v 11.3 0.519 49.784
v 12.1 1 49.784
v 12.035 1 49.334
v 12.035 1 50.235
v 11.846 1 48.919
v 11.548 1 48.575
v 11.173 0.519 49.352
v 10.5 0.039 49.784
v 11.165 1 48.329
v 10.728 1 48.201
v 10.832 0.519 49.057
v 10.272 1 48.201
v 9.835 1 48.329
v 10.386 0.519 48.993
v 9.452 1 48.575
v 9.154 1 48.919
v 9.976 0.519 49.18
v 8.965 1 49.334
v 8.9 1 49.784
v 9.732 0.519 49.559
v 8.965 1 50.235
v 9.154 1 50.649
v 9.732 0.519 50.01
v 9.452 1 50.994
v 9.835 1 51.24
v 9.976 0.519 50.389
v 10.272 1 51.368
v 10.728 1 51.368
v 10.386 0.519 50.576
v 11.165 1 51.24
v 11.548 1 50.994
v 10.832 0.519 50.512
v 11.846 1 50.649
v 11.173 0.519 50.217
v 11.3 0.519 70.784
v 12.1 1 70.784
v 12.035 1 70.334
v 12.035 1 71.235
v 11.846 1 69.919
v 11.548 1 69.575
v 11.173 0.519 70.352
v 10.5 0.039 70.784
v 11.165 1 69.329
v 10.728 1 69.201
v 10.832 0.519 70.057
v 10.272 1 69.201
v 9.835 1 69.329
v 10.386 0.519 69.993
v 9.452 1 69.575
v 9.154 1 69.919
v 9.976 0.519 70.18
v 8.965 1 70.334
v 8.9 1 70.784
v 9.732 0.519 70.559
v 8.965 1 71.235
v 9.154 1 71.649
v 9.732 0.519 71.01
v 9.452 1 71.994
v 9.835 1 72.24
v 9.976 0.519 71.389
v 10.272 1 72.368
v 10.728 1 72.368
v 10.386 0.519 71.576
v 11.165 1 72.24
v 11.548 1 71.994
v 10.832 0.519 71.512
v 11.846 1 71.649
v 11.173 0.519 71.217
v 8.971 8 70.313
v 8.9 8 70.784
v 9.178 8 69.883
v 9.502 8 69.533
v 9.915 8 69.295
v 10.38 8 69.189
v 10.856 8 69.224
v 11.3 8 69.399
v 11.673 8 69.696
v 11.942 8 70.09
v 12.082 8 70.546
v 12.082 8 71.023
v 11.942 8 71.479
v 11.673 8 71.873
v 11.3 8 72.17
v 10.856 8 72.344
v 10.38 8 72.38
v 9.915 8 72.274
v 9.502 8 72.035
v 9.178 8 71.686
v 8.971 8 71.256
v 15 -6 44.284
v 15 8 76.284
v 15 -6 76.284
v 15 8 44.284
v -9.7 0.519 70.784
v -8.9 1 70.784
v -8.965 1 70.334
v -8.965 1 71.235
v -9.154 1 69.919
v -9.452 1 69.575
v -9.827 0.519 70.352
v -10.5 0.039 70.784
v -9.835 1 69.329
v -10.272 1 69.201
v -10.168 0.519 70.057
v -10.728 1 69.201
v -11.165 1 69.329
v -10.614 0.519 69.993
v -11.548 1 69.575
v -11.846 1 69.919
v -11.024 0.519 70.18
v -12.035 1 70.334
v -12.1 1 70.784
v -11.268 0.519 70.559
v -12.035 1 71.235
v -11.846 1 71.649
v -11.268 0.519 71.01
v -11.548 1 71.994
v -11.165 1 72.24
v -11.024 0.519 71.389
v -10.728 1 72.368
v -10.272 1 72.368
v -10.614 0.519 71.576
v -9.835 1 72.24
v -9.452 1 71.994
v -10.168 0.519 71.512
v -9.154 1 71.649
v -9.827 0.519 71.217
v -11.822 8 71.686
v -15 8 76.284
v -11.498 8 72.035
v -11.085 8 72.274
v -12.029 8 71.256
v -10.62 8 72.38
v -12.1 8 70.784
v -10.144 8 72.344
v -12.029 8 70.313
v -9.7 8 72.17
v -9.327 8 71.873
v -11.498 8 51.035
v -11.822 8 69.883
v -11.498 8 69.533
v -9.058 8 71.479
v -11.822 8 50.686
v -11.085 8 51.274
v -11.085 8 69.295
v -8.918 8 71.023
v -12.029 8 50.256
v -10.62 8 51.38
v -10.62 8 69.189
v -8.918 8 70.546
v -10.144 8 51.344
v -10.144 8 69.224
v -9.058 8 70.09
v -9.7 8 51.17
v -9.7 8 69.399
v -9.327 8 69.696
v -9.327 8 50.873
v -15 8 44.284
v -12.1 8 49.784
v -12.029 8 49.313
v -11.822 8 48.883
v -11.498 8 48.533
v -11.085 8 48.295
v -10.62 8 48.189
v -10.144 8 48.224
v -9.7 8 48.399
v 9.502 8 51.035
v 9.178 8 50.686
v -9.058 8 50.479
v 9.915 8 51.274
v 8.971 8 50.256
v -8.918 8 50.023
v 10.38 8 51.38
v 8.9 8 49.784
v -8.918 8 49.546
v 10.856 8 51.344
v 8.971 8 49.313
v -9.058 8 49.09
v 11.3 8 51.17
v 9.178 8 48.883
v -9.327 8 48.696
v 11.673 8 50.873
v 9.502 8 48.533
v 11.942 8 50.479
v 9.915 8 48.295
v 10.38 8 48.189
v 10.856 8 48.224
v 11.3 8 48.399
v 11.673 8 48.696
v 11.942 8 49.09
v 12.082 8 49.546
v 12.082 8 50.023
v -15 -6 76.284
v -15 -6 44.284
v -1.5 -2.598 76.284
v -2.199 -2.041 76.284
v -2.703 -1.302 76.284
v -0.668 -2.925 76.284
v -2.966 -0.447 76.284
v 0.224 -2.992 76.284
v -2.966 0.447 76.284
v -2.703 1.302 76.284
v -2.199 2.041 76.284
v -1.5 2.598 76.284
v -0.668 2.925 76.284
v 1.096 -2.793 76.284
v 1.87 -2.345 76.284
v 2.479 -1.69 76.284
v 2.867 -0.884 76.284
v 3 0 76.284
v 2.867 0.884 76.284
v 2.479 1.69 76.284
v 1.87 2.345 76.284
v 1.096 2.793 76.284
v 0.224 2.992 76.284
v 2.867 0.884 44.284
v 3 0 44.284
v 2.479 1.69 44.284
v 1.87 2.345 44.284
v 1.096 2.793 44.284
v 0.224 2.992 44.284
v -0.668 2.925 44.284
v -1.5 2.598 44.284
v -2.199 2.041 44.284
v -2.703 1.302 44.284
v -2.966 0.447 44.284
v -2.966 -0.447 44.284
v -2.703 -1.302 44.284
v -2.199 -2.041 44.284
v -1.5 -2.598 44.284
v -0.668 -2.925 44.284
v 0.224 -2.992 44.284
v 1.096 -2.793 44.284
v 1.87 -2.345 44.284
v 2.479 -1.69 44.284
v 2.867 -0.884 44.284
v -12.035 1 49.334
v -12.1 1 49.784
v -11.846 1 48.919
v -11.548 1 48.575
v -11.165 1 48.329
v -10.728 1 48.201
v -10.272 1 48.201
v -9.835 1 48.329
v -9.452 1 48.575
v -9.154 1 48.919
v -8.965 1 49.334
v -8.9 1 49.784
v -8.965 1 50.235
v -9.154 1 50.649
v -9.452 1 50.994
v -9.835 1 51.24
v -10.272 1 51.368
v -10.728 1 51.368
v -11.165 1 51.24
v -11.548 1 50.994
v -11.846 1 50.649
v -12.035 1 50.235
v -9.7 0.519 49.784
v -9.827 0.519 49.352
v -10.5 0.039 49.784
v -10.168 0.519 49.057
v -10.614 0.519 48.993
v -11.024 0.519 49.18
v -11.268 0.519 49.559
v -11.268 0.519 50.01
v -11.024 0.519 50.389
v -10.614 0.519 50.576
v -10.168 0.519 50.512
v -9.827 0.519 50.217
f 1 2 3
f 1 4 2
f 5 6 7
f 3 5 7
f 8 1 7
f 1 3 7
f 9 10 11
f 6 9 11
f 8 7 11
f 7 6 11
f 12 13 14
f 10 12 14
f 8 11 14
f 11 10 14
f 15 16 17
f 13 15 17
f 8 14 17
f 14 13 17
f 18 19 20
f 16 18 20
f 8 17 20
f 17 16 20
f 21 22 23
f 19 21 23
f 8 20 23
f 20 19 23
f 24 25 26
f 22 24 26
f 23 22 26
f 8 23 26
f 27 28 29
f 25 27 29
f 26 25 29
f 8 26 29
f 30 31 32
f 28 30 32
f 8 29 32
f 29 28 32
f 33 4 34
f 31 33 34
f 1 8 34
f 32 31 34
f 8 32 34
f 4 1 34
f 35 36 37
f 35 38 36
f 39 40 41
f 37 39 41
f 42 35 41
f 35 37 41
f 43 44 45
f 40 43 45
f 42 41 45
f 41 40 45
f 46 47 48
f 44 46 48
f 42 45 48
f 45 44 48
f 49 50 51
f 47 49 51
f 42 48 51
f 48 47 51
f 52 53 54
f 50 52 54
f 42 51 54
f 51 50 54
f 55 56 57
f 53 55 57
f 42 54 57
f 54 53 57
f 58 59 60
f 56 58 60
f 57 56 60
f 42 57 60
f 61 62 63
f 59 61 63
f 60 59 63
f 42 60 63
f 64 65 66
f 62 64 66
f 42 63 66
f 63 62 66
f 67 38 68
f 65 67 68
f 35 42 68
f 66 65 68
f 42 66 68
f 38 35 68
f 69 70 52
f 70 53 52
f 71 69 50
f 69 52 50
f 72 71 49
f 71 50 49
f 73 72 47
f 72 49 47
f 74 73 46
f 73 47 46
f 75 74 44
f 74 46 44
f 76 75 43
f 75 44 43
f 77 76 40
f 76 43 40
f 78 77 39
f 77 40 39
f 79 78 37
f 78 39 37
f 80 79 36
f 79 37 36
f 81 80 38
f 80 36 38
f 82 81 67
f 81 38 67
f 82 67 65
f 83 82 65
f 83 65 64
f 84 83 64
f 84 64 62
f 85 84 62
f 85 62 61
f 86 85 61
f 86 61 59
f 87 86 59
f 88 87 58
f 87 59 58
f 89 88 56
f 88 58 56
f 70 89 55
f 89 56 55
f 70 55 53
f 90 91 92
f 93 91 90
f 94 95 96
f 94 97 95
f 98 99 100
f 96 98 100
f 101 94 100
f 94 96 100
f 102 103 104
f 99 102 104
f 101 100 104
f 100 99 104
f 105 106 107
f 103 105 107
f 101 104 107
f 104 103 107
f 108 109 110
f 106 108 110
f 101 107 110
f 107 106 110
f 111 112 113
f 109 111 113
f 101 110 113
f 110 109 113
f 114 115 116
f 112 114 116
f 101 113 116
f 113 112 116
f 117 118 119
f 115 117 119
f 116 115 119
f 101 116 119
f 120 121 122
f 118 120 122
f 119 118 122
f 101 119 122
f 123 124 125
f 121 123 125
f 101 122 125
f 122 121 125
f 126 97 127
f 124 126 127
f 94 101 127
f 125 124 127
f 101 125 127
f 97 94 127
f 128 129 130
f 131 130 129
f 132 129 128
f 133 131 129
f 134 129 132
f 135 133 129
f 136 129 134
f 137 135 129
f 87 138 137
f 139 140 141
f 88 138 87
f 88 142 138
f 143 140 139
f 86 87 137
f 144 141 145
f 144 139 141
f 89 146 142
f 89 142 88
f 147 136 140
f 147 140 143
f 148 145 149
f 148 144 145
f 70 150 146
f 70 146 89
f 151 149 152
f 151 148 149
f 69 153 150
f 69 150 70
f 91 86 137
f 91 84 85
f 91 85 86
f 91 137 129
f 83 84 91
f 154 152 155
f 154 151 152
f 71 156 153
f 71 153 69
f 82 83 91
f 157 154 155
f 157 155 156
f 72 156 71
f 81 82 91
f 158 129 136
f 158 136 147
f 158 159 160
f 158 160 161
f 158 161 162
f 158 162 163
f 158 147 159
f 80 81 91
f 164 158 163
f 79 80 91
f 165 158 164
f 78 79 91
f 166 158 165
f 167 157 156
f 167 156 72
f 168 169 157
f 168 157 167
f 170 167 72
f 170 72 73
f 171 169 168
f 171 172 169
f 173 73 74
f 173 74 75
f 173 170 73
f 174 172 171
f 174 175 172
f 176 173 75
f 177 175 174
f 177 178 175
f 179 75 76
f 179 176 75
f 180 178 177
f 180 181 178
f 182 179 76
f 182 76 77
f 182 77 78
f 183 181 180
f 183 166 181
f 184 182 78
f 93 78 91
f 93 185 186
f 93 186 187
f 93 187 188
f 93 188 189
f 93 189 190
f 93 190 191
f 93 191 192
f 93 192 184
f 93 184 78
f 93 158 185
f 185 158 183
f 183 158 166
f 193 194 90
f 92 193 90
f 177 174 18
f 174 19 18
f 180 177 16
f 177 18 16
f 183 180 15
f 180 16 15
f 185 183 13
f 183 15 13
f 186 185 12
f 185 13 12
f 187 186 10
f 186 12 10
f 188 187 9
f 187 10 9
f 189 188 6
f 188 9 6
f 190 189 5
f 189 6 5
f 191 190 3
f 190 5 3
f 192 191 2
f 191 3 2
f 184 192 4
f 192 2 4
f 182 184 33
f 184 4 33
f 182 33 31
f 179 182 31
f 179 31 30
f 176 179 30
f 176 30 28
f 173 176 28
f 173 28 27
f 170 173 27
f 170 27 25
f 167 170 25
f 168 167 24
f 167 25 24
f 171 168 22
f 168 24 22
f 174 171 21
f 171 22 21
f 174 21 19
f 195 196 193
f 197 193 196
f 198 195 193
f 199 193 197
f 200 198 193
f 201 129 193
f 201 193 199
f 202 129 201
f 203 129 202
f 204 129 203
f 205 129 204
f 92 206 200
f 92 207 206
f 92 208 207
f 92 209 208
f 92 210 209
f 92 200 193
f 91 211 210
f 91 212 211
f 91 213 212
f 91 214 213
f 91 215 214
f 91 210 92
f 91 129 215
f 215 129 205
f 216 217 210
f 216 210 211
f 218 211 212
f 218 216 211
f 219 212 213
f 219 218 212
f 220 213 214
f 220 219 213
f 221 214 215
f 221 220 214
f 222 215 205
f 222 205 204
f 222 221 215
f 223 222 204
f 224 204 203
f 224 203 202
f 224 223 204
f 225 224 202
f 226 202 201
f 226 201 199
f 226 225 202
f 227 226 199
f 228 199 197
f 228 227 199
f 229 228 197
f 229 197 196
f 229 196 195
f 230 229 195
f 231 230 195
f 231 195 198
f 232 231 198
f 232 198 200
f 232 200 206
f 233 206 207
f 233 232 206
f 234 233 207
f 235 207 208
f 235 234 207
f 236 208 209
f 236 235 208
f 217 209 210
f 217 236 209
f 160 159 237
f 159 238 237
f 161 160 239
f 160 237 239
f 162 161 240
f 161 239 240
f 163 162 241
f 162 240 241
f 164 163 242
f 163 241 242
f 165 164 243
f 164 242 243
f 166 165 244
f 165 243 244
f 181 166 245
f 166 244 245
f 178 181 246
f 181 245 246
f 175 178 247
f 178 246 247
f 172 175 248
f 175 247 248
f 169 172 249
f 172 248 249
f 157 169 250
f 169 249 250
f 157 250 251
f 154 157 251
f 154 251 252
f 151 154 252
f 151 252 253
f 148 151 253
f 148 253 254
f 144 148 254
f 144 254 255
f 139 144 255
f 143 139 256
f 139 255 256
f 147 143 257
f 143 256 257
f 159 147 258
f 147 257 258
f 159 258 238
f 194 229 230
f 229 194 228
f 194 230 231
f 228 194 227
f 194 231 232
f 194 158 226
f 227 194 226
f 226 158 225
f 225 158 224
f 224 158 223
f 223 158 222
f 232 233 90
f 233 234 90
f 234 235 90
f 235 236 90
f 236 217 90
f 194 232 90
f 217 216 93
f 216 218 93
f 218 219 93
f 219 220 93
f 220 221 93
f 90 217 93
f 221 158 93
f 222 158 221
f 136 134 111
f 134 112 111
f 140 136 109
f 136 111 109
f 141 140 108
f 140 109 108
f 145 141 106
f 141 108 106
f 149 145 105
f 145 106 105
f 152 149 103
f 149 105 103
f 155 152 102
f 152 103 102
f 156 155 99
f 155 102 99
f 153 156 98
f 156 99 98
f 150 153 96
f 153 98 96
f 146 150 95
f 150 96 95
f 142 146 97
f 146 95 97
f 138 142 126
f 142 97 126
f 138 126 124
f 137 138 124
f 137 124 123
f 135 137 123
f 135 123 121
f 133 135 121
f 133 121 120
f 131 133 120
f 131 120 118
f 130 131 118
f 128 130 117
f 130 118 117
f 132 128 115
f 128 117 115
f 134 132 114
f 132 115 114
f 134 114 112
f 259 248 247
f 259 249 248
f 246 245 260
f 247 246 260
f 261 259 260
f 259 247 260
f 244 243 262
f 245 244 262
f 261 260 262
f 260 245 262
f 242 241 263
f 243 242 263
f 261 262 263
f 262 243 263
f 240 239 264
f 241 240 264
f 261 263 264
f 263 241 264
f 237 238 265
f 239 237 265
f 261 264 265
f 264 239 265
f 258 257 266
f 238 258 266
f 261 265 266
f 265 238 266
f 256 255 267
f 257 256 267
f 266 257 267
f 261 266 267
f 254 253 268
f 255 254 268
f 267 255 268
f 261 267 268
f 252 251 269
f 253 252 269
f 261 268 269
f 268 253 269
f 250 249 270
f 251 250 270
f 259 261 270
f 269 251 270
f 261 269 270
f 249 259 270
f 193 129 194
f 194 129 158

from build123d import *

# Parameters (mm, degrees)
SKETCH1_W                = 30
SKETCH1_H                = 32
BOSS_EXTRUDE1_DEPTH      = 14
CAVITY1_START            = 44.284378121
CAVITY1_OUTLINE_R        = 3
CAVITY1_DEPTH            = 32
M3_CLEARANCE_HOLE1_D     = 3.2
M3_CLEARANCE_HOLE1_DEPTH = 7
M3_CLEARANCE_HOLE1_TIP   = 0.96137699


# Read off the part's stored shape, not the designer's step: Cavity1
with BuildPart() as part:
    # Sketch1 → Boss-Extrude1 (new body)
    with BuildSketch(Plane(origin=(0, 8, 0), x_dir=(1, 0, 0), z_dir=(0, 1, 0))):
        with Locations((0, -60.284378121)):
            Rectangle(SKETCH1_W, SKETCH1_H)
    extrude(amount=-BOSS_EXTRUDE1_DEPTH)

    # Cavity1 outline → Cavity1 (cut)
    with BuildSketch(Plane.XY.offset(CAVITY1_START)):
        Circle(CAVITY1_OUTLINE_R)
    extrude(amount=CAVITY1_DEPTH, mode=Mode.SUBTRACT)

    # M3 Clearance Hole1
    with Locations(Plane(origin=(0, 8, 0), x_dir=(1, 0, 0), z_dir=(0, 1, 0))):
        with Locations((10.5, -49.784378121), (-10.5, -49.784378121), (-10.5, -70.784378121), (10.5, -70.784378121)):
            Hole(M3_CLEARANCE_HOLE1_D / 2, depth=M3_CLEARANCE_HOLE1_DEPTH)
            with Locations((0, 0, -(M3_CLEARANCE_HOLE1_DEPTH + M3_CLEARANCE_HOLE1_TIP / 2))):  # 118° drill point
                Cone(0, M3_CLEARANCE_HOLE1_D / 2, M3_CLEARANCE_HOLE1_TIP, mode=Mode.SUBTRACT)


solid = part.part
